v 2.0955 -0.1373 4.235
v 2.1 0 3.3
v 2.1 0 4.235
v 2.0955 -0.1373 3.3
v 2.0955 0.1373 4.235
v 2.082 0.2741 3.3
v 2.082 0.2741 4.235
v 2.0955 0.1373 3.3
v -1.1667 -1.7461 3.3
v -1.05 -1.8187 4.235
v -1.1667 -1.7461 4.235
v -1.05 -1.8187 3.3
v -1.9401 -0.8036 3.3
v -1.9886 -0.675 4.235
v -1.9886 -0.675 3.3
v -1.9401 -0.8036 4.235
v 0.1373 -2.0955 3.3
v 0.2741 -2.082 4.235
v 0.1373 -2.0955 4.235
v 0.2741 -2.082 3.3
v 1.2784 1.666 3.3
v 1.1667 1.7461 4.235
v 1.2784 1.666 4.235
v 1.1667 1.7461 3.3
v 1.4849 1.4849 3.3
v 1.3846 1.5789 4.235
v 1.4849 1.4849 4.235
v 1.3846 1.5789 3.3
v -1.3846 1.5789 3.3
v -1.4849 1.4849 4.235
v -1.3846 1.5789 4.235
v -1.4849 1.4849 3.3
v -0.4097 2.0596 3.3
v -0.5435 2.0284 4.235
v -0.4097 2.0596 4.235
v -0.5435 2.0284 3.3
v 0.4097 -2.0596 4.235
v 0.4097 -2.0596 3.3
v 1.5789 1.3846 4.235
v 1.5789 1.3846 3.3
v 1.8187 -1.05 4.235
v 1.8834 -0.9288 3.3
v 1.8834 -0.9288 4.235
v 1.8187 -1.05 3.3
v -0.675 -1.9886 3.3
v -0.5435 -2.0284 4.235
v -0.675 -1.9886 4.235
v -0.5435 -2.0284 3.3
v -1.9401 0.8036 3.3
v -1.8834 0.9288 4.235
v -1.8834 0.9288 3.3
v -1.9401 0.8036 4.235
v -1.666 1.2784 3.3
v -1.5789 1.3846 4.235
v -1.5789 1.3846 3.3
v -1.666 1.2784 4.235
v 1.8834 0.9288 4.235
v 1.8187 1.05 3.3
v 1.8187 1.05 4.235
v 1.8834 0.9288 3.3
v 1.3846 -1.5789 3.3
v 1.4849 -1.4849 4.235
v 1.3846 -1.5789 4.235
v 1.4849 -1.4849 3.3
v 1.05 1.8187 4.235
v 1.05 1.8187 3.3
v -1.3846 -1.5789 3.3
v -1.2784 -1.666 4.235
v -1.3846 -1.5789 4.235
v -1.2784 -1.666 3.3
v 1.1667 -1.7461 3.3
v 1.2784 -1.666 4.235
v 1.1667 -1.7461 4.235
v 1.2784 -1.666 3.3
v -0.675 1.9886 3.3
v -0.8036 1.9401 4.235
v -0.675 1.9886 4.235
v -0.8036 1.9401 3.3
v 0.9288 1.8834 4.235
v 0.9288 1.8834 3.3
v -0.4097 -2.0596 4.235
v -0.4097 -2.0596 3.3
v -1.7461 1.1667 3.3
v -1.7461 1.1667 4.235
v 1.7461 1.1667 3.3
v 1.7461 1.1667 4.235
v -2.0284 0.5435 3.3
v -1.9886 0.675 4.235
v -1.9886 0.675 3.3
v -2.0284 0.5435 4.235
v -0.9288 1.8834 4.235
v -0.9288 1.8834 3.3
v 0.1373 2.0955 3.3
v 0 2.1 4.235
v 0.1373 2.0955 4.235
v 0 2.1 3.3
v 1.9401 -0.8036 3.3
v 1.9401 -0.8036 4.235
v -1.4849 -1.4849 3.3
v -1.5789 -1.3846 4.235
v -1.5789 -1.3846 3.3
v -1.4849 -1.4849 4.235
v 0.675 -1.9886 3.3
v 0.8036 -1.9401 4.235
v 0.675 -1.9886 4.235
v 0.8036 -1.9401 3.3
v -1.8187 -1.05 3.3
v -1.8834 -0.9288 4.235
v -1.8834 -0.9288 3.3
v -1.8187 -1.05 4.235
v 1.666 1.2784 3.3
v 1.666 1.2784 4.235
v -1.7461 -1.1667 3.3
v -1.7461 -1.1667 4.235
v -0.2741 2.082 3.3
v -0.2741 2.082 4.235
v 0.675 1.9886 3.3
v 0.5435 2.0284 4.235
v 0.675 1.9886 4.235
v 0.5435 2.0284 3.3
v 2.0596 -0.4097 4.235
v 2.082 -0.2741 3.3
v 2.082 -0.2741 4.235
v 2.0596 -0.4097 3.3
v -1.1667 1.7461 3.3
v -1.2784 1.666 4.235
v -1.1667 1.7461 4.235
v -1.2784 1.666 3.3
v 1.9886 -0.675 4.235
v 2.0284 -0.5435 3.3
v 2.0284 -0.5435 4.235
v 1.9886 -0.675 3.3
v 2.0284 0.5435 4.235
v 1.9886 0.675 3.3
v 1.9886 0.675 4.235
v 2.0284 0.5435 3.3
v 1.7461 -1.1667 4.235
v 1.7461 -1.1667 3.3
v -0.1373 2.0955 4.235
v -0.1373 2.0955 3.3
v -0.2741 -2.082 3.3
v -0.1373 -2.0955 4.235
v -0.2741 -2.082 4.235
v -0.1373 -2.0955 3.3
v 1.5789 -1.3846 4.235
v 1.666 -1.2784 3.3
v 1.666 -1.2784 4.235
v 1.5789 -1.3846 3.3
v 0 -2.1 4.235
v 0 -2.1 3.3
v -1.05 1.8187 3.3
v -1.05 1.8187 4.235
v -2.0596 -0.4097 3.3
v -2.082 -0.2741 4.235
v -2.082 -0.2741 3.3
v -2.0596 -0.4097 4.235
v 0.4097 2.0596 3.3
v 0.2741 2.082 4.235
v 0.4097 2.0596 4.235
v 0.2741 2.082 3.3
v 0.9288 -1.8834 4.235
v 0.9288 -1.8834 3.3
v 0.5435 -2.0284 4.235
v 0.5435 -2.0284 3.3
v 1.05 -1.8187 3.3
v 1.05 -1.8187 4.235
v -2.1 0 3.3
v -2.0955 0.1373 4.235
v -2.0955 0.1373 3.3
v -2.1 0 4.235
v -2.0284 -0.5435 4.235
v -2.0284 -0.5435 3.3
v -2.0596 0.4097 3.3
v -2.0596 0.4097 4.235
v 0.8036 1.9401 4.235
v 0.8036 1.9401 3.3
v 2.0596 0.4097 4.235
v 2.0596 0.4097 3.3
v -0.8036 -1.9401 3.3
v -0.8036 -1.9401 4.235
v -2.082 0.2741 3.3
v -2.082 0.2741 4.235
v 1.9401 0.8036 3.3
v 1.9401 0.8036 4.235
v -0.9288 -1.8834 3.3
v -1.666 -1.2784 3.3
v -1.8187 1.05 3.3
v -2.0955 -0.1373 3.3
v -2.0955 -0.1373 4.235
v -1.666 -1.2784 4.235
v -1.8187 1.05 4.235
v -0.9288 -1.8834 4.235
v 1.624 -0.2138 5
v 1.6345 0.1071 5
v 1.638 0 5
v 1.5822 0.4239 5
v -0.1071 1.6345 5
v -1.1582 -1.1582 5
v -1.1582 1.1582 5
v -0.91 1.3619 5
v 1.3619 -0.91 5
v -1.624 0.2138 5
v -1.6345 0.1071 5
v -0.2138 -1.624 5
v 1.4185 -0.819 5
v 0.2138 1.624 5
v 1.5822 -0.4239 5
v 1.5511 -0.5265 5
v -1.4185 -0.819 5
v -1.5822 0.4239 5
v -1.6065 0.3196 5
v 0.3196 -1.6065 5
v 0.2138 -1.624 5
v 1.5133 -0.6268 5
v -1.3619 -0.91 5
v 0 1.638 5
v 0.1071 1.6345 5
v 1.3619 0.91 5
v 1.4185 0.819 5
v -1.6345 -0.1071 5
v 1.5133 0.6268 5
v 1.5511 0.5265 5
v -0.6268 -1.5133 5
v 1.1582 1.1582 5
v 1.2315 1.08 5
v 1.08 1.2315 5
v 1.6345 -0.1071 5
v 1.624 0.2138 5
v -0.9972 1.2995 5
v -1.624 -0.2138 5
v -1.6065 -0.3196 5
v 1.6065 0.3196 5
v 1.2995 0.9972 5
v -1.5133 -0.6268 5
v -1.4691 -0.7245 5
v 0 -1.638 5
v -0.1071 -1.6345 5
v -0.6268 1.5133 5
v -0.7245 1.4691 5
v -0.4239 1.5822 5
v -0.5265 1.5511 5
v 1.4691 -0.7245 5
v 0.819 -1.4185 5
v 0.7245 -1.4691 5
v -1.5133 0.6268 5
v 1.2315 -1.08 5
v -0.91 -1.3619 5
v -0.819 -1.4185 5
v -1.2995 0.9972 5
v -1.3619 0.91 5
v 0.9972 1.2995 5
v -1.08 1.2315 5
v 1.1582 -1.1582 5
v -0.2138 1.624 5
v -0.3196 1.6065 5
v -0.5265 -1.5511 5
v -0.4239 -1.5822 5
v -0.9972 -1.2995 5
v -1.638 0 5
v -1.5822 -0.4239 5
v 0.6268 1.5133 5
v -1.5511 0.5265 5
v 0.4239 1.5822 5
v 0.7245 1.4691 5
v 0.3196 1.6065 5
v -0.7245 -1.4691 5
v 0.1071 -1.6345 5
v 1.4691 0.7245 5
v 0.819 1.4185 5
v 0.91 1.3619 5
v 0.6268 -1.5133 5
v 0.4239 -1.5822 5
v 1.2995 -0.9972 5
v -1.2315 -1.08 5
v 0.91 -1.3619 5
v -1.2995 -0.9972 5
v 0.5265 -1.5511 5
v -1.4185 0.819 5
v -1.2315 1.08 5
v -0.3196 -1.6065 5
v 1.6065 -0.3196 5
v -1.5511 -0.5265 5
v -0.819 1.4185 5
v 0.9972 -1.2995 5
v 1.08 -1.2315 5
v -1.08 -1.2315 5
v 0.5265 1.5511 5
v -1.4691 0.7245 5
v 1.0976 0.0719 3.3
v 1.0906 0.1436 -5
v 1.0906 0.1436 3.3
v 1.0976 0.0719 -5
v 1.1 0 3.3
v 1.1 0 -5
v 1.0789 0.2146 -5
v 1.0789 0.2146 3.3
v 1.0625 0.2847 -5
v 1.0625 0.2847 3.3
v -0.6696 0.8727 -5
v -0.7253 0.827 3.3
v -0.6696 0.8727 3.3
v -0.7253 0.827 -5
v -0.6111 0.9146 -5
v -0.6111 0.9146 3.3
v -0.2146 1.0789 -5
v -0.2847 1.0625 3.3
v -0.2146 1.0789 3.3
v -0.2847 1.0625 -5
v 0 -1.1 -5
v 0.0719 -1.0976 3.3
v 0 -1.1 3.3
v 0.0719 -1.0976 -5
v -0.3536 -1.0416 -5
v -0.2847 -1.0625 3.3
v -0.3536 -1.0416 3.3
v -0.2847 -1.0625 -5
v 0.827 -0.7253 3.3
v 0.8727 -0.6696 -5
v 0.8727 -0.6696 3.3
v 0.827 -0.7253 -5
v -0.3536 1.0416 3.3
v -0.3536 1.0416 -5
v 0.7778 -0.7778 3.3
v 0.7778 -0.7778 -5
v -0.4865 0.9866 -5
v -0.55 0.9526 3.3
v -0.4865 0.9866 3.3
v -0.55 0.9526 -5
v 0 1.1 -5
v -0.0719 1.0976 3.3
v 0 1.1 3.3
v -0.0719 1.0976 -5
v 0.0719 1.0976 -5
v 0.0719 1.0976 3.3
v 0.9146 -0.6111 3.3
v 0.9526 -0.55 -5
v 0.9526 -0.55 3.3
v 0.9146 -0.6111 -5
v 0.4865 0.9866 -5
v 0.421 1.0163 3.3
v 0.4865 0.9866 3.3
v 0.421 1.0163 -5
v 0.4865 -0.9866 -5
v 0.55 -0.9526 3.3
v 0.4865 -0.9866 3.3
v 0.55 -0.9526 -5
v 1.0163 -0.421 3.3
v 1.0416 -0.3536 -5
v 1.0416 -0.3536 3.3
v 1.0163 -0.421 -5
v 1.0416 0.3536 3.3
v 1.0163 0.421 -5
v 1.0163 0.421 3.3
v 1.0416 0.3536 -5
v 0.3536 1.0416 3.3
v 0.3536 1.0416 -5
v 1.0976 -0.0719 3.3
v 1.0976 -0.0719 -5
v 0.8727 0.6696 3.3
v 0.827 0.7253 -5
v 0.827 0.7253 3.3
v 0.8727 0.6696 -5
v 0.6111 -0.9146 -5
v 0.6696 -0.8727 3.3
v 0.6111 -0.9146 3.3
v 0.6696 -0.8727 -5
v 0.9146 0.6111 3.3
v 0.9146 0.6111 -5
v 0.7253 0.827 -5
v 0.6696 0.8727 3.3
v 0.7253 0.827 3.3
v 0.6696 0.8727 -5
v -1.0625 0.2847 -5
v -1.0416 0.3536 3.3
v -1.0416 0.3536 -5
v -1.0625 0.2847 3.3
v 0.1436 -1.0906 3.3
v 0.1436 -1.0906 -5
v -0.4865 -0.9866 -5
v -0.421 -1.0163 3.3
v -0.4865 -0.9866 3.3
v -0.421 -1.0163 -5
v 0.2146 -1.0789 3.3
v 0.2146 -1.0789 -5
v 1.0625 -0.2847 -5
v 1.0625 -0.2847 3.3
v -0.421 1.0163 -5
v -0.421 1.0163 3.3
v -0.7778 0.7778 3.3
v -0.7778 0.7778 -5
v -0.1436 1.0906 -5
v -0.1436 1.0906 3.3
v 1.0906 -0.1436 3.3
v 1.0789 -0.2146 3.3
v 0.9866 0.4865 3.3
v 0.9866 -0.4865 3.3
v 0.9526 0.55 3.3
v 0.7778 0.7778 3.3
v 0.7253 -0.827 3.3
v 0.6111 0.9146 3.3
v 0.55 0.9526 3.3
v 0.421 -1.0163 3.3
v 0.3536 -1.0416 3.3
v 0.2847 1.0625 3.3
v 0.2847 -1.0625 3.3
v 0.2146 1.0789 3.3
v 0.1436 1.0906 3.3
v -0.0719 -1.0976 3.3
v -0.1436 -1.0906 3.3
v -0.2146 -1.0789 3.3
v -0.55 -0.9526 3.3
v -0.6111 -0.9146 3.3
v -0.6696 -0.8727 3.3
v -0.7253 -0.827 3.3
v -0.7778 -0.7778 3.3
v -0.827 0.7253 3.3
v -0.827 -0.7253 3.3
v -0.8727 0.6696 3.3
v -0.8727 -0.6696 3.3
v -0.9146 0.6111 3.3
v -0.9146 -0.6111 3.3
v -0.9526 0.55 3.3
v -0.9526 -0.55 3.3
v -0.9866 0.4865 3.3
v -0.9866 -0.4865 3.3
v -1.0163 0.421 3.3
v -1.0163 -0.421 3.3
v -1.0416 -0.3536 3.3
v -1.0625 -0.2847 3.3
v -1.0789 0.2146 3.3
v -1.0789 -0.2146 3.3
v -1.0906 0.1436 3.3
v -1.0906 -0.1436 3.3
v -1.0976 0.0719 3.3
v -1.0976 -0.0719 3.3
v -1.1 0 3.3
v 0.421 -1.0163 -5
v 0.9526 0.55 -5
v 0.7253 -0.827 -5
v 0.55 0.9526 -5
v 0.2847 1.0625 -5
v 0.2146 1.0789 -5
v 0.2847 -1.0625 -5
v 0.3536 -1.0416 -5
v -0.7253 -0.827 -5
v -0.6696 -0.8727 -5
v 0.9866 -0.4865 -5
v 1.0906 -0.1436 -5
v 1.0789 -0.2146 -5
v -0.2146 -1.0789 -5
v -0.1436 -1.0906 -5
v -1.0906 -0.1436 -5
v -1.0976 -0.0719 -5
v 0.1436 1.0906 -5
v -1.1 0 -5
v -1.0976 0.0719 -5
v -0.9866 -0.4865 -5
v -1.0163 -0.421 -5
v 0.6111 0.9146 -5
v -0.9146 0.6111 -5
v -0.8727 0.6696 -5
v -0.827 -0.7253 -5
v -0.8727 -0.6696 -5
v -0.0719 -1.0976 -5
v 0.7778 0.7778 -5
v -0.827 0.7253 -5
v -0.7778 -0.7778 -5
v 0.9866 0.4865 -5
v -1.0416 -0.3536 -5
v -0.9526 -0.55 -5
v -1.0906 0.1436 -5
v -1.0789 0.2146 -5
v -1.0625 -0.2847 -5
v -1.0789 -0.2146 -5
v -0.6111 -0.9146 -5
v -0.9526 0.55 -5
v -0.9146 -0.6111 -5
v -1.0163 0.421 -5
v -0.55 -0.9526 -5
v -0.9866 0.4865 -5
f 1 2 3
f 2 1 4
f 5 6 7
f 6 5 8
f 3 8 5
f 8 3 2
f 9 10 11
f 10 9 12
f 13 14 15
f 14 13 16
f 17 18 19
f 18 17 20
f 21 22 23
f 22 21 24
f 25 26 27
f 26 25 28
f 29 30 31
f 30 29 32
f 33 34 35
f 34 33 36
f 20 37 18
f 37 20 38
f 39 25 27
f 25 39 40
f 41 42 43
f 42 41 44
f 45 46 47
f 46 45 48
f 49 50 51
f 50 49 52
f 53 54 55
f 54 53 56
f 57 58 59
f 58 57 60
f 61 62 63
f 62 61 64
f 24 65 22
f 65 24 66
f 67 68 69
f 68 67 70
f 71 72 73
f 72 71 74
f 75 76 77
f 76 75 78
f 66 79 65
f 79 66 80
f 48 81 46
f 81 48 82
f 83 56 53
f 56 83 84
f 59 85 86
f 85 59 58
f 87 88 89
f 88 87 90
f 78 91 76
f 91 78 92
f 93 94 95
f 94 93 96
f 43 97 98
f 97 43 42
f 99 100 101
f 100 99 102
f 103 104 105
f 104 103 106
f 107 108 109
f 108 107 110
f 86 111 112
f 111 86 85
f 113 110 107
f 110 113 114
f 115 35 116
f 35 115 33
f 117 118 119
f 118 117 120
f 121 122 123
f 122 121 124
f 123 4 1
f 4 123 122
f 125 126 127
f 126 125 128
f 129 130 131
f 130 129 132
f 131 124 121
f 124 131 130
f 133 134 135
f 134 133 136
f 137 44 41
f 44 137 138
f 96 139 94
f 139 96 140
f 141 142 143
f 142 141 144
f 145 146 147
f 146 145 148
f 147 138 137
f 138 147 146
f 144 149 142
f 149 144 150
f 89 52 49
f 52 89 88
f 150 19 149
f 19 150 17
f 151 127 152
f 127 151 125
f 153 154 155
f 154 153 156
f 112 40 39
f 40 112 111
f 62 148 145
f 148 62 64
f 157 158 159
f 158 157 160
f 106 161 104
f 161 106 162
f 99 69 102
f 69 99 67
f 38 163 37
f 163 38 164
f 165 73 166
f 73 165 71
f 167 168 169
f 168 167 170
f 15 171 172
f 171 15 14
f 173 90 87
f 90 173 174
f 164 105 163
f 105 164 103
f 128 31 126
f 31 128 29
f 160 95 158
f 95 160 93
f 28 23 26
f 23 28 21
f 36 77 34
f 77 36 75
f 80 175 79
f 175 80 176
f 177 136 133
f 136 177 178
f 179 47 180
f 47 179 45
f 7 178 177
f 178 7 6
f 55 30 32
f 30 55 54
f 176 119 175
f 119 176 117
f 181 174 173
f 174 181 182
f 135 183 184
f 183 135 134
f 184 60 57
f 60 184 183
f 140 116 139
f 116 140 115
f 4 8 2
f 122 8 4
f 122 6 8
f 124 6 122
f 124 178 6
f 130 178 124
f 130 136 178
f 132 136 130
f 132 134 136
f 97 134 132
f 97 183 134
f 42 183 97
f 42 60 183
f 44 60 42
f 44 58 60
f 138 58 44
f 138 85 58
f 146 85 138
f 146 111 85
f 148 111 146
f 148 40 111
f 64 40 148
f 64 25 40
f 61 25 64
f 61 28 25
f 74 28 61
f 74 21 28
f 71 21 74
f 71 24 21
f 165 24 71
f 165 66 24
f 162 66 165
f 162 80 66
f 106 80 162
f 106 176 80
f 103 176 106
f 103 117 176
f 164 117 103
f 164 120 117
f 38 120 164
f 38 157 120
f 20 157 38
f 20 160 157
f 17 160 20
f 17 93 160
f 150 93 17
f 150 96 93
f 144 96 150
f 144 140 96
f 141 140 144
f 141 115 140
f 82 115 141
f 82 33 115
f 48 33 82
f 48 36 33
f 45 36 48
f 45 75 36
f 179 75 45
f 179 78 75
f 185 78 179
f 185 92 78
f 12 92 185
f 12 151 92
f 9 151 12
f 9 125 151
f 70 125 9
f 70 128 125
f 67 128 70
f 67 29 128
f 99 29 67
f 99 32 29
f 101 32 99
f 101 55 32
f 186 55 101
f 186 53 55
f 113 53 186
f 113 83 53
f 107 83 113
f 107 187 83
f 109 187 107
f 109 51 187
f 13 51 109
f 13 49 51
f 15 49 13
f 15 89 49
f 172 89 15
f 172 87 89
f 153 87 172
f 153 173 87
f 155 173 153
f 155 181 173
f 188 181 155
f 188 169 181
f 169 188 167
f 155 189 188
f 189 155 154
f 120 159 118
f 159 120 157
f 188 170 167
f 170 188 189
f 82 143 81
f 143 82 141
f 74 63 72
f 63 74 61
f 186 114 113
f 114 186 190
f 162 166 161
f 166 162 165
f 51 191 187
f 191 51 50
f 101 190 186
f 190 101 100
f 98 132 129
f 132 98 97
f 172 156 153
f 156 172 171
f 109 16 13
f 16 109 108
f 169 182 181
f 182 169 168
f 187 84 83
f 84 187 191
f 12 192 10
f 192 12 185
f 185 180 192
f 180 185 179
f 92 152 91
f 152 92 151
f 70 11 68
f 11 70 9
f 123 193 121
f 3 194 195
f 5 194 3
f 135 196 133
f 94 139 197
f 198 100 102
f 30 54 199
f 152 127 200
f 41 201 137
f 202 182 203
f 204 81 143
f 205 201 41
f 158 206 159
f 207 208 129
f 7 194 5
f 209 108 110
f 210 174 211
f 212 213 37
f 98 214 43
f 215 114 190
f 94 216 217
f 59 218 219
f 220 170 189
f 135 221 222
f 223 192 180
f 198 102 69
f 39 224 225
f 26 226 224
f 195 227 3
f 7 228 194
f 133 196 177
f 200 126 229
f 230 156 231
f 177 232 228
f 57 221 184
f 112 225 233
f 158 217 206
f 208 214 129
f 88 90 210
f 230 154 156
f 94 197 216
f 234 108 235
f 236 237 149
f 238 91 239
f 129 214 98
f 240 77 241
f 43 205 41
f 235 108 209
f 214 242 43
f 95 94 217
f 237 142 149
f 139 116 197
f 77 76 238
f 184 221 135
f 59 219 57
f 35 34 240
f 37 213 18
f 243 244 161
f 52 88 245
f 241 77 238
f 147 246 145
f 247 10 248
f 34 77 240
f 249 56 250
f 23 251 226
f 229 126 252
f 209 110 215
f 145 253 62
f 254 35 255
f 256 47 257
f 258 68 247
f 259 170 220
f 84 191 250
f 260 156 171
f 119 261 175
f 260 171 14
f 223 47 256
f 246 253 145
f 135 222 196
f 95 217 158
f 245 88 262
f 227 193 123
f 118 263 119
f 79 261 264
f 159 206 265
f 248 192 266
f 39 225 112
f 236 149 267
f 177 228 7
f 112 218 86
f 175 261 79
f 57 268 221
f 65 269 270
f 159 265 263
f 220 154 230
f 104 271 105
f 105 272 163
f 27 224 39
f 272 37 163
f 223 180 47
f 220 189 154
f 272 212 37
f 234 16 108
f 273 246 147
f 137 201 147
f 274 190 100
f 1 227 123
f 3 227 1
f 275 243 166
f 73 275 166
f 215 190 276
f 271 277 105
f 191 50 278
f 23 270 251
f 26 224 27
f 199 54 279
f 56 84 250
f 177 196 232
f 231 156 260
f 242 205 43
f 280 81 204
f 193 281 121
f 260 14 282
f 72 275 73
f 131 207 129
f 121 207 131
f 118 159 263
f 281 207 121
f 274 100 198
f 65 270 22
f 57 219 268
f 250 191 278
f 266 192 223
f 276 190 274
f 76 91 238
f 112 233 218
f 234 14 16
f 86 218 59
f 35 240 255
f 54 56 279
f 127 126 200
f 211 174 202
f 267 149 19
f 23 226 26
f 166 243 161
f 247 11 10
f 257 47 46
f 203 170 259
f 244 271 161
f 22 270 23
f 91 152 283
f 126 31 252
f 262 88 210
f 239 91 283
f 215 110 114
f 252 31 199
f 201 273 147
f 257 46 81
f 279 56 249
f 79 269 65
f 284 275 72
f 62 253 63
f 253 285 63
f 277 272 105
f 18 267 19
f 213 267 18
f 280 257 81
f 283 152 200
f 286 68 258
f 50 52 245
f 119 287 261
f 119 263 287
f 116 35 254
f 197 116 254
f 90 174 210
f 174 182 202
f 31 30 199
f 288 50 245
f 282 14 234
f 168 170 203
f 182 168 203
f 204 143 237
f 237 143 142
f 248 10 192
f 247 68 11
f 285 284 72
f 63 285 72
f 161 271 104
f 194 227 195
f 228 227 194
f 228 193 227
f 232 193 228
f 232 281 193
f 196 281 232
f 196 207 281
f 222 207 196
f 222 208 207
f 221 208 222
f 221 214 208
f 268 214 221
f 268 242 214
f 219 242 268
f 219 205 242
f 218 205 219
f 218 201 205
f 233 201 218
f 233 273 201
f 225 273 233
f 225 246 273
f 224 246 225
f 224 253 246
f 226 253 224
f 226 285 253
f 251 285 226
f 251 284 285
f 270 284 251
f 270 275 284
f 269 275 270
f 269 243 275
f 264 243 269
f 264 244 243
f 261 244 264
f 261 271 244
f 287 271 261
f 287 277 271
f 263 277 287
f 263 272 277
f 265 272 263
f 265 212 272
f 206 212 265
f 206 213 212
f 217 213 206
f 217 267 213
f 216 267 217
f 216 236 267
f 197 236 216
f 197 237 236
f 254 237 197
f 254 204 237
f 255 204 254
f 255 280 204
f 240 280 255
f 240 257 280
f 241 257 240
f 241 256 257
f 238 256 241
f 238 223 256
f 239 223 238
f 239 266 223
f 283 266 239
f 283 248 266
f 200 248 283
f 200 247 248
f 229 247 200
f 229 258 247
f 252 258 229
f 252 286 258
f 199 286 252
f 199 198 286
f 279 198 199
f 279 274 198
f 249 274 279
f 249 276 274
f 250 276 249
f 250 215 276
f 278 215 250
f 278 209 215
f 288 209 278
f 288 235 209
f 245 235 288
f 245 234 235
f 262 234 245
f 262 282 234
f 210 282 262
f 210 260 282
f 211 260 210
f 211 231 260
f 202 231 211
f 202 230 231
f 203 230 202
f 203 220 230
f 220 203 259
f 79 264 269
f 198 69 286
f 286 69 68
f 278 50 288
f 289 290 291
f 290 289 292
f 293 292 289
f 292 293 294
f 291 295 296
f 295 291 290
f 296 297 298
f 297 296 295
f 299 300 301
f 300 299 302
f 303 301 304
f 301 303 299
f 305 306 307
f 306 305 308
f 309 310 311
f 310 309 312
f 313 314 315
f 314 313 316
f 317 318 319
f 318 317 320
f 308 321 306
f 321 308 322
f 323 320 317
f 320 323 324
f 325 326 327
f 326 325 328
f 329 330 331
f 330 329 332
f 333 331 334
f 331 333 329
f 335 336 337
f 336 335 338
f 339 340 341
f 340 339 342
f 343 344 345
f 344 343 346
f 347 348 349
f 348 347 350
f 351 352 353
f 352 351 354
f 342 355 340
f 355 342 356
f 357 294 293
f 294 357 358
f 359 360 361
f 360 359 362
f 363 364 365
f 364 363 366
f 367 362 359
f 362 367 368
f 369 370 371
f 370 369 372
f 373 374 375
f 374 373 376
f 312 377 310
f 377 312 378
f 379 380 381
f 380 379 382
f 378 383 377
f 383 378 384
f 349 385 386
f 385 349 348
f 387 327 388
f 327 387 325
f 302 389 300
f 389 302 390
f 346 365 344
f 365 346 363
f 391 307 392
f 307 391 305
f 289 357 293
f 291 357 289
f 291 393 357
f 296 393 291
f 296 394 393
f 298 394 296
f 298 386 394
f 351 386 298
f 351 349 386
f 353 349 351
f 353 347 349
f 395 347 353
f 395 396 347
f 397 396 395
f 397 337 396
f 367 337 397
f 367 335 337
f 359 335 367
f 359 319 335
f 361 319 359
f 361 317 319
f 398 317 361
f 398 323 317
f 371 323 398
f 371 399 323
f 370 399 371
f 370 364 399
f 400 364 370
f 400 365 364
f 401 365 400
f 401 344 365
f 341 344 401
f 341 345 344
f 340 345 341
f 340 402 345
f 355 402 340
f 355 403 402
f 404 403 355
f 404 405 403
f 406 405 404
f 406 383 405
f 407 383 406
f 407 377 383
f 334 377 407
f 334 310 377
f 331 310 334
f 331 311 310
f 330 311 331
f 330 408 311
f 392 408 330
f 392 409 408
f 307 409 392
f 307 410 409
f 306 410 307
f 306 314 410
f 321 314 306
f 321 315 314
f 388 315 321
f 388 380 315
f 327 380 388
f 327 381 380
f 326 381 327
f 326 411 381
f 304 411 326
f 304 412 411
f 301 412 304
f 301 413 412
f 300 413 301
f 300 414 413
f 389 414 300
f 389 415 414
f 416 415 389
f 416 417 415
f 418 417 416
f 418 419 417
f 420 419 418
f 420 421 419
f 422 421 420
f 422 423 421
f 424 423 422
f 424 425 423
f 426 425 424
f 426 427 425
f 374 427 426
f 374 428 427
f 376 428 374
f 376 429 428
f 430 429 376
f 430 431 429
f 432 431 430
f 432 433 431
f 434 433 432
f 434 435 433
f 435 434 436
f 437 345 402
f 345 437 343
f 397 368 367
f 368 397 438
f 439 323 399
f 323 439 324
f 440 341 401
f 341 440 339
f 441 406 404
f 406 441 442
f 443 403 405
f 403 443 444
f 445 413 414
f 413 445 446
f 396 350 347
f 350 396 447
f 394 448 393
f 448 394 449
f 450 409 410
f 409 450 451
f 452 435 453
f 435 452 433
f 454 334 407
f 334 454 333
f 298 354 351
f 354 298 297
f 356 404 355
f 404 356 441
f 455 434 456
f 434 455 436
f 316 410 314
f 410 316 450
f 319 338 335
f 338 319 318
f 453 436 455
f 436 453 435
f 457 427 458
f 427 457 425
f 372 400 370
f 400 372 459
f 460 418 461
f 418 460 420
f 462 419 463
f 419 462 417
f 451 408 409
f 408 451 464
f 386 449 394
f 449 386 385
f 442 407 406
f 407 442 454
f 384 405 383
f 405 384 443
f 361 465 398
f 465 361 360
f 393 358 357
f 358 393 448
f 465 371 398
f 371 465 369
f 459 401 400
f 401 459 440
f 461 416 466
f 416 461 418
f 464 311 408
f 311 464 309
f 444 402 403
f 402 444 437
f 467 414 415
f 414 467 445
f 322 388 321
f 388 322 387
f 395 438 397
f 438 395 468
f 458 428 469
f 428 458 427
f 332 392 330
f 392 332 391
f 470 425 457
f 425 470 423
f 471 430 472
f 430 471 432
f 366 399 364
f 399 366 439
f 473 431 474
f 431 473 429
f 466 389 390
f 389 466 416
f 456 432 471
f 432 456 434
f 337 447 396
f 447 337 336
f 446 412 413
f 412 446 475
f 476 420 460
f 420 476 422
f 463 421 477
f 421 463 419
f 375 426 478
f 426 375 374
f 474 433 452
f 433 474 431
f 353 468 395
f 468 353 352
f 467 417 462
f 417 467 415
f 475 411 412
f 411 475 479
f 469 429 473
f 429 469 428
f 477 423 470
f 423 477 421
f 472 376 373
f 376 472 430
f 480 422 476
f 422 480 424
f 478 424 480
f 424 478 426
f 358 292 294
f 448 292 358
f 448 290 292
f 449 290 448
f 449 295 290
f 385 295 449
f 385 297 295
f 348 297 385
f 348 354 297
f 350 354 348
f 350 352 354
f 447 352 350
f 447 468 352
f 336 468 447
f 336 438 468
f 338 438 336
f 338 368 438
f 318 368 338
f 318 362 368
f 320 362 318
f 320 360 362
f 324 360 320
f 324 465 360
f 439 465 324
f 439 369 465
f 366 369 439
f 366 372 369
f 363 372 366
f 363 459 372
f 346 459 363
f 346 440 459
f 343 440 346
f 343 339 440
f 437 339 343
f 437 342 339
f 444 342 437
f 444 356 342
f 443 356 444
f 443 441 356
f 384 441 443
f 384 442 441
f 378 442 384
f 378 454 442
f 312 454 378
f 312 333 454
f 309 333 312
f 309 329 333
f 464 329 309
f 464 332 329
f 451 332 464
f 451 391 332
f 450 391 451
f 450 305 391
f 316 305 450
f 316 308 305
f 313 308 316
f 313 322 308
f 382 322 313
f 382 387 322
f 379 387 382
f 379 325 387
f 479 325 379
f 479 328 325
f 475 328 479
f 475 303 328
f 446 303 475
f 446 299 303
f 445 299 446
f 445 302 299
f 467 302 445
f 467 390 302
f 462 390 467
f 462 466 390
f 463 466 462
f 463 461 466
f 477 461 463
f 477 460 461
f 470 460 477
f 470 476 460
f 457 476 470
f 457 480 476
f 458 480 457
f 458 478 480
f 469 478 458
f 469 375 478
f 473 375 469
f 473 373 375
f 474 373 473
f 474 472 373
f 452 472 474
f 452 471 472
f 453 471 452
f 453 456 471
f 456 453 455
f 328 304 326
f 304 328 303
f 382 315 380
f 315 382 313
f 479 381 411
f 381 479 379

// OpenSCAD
$fn=96;

d_shaft = 2.2;
r_shaft = d_shaft/2;

d_head = 4.2;
r_head = d_head/2;
h_head = 1.7;

L_total = 10;
h_shaft = L_total - h_head;

module pan_head(h=h_head, r=r_head){
    union(){
        cylinder(h=h*0.55, r=r);
        translate([0,0,h*0.55])
            cylinder(h=h*0.45, r1=r, r2=r*0.78);
    }
}

module screw(){
    union(){
        translate([0,0,-L_total/2])
            cylinder(h=h_shaft, r=r_shaft);
        translate([0,0,-L_total/2 + h_shaft])
            pan_head();
    }
}

screw();
